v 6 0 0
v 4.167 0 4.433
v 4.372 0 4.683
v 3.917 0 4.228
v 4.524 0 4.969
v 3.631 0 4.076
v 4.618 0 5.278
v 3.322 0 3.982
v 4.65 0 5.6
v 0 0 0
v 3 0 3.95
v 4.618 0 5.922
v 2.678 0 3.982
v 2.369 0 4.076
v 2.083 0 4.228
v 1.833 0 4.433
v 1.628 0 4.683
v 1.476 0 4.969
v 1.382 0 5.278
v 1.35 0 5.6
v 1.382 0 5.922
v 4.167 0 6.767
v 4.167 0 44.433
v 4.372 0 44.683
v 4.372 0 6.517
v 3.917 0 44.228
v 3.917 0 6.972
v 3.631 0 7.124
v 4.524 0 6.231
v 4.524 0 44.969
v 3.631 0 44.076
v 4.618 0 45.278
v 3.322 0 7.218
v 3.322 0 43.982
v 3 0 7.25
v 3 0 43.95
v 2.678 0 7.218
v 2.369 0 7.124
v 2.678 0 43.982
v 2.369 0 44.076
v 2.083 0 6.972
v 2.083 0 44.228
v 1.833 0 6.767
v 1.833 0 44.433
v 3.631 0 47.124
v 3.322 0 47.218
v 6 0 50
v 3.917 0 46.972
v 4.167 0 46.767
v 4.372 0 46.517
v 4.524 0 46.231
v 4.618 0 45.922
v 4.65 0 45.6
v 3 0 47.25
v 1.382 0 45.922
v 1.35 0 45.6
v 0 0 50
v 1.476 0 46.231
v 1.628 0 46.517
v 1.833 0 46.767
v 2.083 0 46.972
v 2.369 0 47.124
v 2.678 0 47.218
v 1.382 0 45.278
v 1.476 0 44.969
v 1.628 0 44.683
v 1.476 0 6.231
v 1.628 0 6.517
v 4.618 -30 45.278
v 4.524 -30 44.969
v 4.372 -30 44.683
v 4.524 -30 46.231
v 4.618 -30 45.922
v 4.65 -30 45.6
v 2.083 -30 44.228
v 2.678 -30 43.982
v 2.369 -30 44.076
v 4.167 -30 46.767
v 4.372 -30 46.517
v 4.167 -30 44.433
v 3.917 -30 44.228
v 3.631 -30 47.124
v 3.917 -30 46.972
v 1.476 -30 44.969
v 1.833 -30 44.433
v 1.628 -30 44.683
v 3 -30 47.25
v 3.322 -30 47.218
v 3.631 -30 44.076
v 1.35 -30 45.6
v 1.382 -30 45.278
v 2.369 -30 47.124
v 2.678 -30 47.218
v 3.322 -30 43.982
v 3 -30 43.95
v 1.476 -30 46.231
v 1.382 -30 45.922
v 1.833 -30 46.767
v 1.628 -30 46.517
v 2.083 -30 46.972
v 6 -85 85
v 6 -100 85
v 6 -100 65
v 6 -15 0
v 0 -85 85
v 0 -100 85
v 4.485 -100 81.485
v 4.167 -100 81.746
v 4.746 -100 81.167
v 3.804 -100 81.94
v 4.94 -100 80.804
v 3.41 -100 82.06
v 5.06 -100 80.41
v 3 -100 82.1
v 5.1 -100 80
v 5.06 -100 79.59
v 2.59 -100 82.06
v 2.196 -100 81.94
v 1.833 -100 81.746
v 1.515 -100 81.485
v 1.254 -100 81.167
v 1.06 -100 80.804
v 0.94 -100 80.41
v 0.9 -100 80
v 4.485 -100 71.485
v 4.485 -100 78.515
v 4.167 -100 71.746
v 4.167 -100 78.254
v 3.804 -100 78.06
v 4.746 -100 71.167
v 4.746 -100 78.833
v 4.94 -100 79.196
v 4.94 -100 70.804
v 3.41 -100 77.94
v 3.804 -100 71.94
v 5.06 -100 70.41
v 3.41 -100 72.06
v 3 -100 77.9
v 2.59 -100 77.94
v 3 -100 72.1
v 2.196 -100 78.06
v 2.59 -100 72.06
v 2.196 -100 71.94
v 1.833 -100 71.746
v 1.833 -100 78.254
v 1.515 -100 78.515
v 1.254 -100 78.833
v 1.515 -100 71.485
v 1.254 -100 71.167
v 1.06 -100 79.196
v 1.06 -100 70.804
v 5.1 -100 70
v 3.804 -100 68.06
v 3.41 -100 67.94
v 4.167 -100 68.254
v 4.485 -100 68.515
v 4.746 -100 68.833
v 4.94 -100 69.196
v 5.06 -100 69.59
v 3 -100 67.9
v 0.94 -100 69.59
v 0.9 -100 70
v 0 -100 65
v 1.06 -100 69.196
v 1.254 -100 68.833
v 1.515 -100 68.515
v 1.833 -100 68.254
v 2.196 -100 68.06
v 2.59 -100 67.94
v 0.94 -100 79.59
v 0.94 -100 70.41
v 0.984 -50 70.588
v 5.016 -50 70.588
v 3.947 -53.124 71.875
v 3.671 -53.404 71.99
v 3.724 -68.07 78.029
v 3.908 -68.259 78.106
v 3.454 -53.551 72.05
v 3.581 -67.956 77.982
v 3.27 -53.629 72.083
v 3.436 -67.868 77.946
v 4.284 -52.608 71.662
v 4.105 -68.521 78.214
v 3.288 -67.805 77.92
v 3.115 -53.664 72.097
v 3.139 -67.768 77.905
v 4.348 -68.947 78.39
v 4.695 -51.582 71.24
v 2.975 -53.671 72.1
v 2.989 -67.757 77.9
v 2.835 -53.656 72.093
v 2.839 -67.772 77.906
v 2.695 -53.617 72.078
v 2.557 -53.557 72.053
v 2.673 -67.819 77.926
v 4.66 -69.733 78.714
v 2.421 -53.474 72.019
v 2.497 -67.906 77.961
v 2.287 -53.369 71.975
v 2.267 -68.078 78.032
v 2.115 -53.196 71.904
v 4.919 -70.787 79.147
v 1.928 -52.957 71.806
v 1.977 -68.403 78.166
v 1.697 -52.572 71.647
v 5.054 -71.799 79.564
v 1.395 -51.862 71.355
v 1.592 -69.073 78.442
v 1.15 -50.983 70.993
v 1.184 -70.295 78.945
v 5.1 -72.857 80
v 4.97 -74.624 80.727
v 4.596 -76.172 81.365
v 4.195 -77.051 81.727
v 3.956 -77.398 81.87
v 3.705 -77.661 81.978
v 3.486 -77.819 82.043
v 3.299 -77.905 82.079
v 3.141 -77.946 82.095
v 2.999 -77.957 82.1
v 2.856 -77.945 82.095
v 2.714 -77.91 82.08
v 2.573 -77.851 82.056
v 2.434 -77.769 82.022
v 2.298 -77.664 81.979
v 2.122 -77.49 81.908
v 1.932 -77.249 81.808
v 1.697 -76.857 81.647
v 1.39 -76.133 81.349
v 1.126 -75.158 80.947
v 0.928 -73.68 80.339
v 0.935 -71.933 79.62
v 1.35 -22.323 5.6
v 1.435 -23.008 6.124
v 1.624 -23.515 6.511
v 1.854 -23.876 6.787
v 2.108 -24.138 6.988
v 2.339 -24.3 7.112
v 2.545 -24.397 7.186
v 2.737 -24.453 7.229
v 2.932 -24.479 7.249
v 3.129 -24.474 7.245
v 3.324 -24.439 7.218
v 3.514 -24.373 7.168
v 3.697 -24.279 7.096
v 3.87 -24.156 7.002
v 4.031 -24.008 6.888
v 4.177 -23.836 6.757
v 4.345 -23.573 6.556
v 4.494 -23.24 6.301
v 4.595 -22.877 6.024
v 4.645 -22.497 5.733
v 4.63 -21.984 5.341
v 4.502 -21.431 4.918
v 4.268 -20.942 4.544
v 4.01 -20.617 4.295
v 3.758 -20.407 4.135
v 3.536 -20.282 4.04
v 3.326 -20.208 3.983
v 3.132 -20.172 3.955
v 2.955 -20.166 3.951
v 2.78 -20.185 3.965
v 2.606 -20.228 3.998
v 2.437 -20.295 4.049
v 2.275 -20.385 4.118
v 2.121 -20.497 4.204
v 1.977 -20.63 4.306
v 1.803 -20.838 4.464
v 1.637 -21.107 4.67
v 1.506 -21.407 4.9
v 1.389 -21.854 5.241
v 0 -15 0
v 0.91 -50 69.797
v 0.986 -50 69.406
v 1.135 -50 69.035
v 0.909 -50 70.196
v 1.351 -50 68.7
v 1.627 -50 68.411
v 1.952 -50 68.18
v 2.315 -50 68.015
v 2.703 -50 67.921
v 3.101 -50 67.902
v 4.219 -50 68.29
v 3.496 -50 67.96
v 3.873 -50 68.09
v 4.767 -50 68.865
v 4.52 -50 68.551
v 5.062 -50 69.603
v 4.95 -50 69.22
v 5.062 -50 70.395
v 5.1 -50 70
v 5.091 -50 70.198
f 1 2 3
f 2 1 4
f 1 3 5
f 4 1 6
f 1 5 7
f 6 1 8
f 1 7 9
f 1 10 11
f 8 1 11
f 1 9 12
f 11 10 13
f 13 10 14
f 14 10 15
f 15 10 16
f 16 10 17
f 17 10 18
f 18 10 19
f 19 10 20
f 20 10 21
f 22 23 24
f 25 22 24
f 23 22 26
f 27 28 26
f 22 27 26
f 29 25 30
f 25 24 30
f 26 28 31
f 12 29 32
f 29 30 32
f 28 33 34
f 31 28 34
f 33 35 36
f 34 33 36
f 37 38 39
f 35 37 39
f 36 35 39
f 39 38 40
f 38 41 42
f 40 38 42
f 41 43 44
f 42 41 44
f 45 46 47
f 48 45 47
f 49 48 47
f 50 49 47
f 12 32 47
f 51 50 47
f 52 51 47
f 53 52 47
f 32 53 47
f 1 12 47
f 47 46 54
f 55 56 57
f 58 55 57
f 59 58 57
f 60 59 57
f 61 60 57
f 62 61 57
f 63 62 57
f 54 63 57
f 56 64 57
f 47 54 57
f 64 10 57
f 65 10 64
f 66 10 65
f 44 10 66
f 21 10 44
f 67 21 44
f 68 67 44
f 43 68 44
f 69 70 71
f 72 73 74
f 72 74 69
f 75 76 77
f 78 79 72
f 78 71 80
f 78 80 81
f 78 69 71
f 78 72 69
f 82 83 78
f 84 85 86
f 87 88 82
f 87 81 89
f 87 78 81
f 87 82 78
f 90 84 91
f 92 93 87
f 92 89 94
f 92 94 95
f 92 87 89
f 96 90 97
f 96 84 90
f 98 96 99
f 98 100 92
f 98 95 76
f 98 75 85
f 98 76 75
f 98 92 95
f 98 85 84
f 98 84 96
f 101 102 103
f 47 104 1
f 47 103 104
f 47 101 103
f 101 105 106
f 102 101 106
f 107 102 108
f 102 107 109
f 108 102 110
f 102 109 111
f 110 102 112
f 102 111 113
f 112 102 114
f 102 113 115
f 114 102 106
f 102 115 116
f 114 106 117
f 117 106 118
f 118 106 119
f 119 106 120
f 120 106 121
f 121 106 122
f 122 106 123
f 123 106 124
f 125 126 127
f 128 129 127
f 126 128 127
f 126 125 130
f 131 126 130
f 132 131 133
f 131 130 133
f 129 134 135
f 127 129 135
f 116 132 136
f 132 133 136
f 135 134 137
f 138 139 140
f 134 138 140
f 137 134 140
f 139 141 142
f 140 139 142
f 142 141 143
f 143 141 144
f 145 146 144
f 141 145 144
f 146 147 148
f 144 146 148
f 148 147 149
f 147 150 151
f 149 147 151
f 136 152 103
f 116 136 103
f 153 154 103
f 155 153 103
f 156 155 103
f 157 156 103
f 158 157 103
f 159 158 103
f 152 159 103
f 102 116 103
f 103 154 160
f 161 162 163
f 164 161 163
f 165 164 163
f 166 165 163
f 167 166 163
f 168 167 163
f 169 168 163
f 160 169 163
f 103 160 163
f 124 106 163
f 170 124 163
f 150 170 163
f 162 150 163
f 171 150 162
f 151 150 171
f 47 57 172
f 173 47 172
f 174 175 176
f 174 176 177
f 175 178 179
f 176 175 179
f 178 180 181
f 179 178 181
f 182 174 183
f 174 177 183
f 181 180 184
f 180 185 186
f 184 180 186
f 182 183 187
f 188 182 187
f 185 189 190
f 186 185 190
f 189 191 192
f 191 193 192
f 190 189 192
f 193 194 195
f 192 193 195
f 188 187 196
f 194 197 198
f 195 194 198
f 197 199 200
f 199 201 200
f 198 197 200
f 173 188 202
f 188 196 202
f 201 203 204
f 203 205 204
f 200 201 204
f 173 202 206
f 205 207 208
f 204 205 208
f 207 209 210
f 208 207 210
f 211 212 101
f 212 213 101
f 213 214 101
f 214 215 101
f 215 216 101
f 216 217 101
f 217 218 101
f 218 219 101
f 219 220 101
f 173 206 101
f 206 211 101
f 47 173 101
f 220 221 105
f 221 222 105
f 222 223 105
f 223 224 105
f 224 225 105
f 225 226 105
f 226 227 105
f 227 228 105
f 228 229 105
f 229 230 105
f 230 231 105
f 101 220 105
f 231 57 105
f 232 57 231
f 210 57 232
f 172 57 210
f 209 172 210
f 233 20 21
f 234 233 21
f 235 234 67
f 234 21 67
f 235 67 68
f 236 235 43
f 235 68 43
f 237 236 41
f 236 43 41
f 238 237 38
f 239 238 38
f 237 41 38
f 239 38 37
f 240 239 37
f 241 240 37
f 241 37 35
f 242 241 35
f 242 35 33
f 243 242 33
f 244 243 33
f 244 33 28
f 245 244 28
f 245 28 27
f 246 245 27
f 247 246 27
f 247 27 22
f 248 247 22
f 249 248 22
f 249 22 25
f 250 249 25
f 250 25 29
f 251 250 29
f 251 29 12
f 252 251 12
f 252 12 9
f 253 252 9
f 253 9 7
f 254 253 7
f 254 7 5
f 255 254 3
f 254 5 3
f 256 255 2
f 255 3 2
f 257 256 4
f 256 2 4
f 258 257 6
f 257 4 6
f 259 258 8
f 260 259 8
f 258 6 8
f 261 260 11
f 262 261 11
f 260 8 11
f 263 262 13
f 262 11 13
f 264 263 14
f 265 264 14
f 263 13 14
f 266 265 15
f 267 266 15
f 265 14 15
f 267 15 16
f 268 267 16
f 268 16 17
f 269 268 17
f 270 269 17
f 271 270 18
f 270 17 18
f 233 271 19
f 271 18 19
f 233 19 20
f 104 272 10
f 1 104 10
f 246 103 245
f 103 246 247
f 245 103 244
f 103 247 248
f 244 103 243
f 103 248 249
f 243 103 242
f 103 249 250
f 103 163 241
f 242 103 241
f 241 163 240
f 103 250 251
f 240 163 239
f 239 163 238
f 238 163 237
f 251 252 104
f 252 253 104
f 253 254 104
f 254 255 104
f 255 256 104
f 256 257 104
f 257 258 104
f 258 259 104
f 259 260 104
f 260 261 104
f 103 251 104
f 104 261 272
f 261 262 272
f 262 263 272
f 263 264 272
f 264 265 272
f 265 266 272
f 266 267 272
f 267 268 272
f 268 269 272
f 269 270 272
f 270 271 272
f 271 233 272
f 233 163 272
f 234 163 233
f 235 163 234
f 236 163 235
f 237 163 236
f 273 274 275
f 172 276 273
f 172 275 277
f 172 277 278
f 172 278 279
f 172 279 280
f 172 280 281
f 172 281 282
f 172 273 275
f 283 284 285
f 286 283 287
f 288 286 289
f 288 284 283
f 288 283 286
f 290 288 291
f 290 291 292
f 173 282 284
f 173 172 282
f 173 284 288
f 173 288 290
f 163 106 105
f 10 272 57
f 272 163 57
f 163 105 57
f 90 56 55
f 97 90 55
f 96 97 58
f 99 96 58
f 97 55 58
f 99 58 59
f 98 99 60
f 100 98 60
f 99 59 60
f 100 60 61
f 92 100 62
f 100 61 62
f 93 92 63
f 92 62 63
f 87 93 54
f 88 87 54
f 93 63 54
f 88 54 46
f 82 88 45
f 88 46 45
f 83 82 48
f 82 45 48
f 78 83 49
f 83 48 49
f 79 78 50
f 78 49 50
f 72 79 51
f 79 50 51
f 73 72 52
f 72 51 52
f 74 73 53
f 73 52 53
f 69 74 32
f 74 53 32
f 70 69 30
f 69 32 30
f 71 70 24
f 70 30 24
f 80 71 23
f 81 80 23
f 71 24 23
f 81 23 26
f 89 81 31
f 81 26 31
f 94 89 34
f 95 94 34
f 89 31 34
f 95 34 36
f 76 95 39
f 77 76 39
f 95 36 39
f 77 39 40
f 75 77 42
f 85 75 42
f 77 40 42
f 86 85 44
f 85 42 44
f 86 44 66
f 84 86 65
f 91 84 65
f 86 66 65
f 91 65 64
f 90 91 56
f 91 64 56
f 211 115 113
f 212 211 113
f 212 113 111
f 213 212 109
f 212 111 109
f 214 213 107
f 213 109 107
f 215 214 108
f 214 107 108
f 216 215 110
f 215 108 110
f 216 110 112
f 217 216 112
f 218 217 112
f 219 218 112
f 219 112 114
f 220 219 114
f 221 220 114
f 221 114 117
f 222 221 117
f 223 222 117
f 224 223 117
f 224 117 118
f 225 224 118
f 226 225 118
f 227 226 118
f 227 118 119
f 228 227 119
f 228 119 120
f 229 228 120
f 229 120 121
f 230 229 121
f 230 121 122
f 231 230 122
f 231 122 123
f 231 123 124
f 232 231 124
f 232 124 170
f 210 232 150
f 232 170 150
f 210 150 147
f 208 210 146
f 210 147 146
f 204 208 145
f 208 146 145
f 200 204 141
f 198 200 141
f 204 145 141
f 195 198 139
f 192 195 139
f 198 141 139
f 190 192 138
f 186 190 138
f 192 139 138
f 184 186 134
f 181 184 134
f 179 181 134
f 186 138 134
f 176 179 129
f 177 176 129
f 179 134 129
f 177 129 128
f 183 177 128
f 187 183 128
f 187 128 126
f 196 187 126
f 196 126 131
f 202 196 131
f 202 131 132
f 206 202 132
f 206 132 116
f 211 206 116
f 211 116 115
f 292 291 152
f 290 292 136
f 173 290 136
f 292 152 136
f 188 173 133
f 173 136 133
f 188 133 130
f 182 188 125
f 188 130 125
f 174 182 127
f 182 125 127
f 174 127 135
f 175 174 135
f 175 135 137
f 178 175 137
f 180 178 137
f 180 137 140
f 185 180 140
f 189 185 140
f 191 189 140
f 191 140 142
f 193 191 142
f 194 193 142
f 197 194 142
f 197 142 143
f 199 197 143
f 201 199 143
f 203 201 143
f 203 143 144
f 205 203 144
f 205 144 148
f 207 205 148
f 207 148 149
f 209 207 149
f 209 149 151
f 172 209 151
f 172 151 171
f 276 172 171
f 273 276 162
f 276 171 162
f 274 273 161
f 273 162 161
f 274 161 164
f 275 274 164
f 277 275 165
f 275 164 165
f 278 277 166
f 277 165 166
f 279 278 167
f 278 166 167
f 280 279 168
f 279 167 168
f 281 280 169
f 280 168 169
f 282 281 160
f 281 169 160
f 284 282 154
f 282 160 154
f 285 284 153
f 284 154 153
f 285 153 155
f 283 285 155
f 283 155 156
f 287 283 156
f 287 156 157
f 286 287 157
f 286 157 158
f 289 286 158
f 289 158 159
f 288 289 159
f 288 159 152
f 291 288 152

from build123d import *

# Parameters (mm, degrees)
F1_DEPTH = 6
F2_R     = 2.1
F3_DEPTH = 50
F4_R     = 1.65
F5_DEPTH = 30


with BuildPart() as f1:
    # F0 (on Right) → F1 (new body)
    with BuildSketch(Plane.YZ):
        Polygon((-15, 0), (0, 0), (0, 50), (-85, 85), (-100, 85), (-100, 65), align=None)
    extrude(amount=F1_DEPTH)

    # F2 (on face) → F3 (cut)
    with BuildSketch(Plane.XZ.offset(100)):
        with Locations((3, 70)):
            Circle(F2_R)
        with Locations((3, 80)):
            Circle(F2_R)
    extrude(amount=-F3_DEPTH, mode=Mode.SUBTRACT)

    # F4 (on face) → F5 (cut)
    with BuildSketch(Plane(origin=(0, 0, 0), x_dir=(-1, 0, 0), z_dir=(0, 1, 0))):
        with Locations((-3, 45.6)):
            Circle(F4_R)
        with Locations((-3, 5.6)):
            Circle(F4_R)
    extrude(amount=-F5_DEPTH, mode=Mode.SUBTRACT)


solid = f1.part
